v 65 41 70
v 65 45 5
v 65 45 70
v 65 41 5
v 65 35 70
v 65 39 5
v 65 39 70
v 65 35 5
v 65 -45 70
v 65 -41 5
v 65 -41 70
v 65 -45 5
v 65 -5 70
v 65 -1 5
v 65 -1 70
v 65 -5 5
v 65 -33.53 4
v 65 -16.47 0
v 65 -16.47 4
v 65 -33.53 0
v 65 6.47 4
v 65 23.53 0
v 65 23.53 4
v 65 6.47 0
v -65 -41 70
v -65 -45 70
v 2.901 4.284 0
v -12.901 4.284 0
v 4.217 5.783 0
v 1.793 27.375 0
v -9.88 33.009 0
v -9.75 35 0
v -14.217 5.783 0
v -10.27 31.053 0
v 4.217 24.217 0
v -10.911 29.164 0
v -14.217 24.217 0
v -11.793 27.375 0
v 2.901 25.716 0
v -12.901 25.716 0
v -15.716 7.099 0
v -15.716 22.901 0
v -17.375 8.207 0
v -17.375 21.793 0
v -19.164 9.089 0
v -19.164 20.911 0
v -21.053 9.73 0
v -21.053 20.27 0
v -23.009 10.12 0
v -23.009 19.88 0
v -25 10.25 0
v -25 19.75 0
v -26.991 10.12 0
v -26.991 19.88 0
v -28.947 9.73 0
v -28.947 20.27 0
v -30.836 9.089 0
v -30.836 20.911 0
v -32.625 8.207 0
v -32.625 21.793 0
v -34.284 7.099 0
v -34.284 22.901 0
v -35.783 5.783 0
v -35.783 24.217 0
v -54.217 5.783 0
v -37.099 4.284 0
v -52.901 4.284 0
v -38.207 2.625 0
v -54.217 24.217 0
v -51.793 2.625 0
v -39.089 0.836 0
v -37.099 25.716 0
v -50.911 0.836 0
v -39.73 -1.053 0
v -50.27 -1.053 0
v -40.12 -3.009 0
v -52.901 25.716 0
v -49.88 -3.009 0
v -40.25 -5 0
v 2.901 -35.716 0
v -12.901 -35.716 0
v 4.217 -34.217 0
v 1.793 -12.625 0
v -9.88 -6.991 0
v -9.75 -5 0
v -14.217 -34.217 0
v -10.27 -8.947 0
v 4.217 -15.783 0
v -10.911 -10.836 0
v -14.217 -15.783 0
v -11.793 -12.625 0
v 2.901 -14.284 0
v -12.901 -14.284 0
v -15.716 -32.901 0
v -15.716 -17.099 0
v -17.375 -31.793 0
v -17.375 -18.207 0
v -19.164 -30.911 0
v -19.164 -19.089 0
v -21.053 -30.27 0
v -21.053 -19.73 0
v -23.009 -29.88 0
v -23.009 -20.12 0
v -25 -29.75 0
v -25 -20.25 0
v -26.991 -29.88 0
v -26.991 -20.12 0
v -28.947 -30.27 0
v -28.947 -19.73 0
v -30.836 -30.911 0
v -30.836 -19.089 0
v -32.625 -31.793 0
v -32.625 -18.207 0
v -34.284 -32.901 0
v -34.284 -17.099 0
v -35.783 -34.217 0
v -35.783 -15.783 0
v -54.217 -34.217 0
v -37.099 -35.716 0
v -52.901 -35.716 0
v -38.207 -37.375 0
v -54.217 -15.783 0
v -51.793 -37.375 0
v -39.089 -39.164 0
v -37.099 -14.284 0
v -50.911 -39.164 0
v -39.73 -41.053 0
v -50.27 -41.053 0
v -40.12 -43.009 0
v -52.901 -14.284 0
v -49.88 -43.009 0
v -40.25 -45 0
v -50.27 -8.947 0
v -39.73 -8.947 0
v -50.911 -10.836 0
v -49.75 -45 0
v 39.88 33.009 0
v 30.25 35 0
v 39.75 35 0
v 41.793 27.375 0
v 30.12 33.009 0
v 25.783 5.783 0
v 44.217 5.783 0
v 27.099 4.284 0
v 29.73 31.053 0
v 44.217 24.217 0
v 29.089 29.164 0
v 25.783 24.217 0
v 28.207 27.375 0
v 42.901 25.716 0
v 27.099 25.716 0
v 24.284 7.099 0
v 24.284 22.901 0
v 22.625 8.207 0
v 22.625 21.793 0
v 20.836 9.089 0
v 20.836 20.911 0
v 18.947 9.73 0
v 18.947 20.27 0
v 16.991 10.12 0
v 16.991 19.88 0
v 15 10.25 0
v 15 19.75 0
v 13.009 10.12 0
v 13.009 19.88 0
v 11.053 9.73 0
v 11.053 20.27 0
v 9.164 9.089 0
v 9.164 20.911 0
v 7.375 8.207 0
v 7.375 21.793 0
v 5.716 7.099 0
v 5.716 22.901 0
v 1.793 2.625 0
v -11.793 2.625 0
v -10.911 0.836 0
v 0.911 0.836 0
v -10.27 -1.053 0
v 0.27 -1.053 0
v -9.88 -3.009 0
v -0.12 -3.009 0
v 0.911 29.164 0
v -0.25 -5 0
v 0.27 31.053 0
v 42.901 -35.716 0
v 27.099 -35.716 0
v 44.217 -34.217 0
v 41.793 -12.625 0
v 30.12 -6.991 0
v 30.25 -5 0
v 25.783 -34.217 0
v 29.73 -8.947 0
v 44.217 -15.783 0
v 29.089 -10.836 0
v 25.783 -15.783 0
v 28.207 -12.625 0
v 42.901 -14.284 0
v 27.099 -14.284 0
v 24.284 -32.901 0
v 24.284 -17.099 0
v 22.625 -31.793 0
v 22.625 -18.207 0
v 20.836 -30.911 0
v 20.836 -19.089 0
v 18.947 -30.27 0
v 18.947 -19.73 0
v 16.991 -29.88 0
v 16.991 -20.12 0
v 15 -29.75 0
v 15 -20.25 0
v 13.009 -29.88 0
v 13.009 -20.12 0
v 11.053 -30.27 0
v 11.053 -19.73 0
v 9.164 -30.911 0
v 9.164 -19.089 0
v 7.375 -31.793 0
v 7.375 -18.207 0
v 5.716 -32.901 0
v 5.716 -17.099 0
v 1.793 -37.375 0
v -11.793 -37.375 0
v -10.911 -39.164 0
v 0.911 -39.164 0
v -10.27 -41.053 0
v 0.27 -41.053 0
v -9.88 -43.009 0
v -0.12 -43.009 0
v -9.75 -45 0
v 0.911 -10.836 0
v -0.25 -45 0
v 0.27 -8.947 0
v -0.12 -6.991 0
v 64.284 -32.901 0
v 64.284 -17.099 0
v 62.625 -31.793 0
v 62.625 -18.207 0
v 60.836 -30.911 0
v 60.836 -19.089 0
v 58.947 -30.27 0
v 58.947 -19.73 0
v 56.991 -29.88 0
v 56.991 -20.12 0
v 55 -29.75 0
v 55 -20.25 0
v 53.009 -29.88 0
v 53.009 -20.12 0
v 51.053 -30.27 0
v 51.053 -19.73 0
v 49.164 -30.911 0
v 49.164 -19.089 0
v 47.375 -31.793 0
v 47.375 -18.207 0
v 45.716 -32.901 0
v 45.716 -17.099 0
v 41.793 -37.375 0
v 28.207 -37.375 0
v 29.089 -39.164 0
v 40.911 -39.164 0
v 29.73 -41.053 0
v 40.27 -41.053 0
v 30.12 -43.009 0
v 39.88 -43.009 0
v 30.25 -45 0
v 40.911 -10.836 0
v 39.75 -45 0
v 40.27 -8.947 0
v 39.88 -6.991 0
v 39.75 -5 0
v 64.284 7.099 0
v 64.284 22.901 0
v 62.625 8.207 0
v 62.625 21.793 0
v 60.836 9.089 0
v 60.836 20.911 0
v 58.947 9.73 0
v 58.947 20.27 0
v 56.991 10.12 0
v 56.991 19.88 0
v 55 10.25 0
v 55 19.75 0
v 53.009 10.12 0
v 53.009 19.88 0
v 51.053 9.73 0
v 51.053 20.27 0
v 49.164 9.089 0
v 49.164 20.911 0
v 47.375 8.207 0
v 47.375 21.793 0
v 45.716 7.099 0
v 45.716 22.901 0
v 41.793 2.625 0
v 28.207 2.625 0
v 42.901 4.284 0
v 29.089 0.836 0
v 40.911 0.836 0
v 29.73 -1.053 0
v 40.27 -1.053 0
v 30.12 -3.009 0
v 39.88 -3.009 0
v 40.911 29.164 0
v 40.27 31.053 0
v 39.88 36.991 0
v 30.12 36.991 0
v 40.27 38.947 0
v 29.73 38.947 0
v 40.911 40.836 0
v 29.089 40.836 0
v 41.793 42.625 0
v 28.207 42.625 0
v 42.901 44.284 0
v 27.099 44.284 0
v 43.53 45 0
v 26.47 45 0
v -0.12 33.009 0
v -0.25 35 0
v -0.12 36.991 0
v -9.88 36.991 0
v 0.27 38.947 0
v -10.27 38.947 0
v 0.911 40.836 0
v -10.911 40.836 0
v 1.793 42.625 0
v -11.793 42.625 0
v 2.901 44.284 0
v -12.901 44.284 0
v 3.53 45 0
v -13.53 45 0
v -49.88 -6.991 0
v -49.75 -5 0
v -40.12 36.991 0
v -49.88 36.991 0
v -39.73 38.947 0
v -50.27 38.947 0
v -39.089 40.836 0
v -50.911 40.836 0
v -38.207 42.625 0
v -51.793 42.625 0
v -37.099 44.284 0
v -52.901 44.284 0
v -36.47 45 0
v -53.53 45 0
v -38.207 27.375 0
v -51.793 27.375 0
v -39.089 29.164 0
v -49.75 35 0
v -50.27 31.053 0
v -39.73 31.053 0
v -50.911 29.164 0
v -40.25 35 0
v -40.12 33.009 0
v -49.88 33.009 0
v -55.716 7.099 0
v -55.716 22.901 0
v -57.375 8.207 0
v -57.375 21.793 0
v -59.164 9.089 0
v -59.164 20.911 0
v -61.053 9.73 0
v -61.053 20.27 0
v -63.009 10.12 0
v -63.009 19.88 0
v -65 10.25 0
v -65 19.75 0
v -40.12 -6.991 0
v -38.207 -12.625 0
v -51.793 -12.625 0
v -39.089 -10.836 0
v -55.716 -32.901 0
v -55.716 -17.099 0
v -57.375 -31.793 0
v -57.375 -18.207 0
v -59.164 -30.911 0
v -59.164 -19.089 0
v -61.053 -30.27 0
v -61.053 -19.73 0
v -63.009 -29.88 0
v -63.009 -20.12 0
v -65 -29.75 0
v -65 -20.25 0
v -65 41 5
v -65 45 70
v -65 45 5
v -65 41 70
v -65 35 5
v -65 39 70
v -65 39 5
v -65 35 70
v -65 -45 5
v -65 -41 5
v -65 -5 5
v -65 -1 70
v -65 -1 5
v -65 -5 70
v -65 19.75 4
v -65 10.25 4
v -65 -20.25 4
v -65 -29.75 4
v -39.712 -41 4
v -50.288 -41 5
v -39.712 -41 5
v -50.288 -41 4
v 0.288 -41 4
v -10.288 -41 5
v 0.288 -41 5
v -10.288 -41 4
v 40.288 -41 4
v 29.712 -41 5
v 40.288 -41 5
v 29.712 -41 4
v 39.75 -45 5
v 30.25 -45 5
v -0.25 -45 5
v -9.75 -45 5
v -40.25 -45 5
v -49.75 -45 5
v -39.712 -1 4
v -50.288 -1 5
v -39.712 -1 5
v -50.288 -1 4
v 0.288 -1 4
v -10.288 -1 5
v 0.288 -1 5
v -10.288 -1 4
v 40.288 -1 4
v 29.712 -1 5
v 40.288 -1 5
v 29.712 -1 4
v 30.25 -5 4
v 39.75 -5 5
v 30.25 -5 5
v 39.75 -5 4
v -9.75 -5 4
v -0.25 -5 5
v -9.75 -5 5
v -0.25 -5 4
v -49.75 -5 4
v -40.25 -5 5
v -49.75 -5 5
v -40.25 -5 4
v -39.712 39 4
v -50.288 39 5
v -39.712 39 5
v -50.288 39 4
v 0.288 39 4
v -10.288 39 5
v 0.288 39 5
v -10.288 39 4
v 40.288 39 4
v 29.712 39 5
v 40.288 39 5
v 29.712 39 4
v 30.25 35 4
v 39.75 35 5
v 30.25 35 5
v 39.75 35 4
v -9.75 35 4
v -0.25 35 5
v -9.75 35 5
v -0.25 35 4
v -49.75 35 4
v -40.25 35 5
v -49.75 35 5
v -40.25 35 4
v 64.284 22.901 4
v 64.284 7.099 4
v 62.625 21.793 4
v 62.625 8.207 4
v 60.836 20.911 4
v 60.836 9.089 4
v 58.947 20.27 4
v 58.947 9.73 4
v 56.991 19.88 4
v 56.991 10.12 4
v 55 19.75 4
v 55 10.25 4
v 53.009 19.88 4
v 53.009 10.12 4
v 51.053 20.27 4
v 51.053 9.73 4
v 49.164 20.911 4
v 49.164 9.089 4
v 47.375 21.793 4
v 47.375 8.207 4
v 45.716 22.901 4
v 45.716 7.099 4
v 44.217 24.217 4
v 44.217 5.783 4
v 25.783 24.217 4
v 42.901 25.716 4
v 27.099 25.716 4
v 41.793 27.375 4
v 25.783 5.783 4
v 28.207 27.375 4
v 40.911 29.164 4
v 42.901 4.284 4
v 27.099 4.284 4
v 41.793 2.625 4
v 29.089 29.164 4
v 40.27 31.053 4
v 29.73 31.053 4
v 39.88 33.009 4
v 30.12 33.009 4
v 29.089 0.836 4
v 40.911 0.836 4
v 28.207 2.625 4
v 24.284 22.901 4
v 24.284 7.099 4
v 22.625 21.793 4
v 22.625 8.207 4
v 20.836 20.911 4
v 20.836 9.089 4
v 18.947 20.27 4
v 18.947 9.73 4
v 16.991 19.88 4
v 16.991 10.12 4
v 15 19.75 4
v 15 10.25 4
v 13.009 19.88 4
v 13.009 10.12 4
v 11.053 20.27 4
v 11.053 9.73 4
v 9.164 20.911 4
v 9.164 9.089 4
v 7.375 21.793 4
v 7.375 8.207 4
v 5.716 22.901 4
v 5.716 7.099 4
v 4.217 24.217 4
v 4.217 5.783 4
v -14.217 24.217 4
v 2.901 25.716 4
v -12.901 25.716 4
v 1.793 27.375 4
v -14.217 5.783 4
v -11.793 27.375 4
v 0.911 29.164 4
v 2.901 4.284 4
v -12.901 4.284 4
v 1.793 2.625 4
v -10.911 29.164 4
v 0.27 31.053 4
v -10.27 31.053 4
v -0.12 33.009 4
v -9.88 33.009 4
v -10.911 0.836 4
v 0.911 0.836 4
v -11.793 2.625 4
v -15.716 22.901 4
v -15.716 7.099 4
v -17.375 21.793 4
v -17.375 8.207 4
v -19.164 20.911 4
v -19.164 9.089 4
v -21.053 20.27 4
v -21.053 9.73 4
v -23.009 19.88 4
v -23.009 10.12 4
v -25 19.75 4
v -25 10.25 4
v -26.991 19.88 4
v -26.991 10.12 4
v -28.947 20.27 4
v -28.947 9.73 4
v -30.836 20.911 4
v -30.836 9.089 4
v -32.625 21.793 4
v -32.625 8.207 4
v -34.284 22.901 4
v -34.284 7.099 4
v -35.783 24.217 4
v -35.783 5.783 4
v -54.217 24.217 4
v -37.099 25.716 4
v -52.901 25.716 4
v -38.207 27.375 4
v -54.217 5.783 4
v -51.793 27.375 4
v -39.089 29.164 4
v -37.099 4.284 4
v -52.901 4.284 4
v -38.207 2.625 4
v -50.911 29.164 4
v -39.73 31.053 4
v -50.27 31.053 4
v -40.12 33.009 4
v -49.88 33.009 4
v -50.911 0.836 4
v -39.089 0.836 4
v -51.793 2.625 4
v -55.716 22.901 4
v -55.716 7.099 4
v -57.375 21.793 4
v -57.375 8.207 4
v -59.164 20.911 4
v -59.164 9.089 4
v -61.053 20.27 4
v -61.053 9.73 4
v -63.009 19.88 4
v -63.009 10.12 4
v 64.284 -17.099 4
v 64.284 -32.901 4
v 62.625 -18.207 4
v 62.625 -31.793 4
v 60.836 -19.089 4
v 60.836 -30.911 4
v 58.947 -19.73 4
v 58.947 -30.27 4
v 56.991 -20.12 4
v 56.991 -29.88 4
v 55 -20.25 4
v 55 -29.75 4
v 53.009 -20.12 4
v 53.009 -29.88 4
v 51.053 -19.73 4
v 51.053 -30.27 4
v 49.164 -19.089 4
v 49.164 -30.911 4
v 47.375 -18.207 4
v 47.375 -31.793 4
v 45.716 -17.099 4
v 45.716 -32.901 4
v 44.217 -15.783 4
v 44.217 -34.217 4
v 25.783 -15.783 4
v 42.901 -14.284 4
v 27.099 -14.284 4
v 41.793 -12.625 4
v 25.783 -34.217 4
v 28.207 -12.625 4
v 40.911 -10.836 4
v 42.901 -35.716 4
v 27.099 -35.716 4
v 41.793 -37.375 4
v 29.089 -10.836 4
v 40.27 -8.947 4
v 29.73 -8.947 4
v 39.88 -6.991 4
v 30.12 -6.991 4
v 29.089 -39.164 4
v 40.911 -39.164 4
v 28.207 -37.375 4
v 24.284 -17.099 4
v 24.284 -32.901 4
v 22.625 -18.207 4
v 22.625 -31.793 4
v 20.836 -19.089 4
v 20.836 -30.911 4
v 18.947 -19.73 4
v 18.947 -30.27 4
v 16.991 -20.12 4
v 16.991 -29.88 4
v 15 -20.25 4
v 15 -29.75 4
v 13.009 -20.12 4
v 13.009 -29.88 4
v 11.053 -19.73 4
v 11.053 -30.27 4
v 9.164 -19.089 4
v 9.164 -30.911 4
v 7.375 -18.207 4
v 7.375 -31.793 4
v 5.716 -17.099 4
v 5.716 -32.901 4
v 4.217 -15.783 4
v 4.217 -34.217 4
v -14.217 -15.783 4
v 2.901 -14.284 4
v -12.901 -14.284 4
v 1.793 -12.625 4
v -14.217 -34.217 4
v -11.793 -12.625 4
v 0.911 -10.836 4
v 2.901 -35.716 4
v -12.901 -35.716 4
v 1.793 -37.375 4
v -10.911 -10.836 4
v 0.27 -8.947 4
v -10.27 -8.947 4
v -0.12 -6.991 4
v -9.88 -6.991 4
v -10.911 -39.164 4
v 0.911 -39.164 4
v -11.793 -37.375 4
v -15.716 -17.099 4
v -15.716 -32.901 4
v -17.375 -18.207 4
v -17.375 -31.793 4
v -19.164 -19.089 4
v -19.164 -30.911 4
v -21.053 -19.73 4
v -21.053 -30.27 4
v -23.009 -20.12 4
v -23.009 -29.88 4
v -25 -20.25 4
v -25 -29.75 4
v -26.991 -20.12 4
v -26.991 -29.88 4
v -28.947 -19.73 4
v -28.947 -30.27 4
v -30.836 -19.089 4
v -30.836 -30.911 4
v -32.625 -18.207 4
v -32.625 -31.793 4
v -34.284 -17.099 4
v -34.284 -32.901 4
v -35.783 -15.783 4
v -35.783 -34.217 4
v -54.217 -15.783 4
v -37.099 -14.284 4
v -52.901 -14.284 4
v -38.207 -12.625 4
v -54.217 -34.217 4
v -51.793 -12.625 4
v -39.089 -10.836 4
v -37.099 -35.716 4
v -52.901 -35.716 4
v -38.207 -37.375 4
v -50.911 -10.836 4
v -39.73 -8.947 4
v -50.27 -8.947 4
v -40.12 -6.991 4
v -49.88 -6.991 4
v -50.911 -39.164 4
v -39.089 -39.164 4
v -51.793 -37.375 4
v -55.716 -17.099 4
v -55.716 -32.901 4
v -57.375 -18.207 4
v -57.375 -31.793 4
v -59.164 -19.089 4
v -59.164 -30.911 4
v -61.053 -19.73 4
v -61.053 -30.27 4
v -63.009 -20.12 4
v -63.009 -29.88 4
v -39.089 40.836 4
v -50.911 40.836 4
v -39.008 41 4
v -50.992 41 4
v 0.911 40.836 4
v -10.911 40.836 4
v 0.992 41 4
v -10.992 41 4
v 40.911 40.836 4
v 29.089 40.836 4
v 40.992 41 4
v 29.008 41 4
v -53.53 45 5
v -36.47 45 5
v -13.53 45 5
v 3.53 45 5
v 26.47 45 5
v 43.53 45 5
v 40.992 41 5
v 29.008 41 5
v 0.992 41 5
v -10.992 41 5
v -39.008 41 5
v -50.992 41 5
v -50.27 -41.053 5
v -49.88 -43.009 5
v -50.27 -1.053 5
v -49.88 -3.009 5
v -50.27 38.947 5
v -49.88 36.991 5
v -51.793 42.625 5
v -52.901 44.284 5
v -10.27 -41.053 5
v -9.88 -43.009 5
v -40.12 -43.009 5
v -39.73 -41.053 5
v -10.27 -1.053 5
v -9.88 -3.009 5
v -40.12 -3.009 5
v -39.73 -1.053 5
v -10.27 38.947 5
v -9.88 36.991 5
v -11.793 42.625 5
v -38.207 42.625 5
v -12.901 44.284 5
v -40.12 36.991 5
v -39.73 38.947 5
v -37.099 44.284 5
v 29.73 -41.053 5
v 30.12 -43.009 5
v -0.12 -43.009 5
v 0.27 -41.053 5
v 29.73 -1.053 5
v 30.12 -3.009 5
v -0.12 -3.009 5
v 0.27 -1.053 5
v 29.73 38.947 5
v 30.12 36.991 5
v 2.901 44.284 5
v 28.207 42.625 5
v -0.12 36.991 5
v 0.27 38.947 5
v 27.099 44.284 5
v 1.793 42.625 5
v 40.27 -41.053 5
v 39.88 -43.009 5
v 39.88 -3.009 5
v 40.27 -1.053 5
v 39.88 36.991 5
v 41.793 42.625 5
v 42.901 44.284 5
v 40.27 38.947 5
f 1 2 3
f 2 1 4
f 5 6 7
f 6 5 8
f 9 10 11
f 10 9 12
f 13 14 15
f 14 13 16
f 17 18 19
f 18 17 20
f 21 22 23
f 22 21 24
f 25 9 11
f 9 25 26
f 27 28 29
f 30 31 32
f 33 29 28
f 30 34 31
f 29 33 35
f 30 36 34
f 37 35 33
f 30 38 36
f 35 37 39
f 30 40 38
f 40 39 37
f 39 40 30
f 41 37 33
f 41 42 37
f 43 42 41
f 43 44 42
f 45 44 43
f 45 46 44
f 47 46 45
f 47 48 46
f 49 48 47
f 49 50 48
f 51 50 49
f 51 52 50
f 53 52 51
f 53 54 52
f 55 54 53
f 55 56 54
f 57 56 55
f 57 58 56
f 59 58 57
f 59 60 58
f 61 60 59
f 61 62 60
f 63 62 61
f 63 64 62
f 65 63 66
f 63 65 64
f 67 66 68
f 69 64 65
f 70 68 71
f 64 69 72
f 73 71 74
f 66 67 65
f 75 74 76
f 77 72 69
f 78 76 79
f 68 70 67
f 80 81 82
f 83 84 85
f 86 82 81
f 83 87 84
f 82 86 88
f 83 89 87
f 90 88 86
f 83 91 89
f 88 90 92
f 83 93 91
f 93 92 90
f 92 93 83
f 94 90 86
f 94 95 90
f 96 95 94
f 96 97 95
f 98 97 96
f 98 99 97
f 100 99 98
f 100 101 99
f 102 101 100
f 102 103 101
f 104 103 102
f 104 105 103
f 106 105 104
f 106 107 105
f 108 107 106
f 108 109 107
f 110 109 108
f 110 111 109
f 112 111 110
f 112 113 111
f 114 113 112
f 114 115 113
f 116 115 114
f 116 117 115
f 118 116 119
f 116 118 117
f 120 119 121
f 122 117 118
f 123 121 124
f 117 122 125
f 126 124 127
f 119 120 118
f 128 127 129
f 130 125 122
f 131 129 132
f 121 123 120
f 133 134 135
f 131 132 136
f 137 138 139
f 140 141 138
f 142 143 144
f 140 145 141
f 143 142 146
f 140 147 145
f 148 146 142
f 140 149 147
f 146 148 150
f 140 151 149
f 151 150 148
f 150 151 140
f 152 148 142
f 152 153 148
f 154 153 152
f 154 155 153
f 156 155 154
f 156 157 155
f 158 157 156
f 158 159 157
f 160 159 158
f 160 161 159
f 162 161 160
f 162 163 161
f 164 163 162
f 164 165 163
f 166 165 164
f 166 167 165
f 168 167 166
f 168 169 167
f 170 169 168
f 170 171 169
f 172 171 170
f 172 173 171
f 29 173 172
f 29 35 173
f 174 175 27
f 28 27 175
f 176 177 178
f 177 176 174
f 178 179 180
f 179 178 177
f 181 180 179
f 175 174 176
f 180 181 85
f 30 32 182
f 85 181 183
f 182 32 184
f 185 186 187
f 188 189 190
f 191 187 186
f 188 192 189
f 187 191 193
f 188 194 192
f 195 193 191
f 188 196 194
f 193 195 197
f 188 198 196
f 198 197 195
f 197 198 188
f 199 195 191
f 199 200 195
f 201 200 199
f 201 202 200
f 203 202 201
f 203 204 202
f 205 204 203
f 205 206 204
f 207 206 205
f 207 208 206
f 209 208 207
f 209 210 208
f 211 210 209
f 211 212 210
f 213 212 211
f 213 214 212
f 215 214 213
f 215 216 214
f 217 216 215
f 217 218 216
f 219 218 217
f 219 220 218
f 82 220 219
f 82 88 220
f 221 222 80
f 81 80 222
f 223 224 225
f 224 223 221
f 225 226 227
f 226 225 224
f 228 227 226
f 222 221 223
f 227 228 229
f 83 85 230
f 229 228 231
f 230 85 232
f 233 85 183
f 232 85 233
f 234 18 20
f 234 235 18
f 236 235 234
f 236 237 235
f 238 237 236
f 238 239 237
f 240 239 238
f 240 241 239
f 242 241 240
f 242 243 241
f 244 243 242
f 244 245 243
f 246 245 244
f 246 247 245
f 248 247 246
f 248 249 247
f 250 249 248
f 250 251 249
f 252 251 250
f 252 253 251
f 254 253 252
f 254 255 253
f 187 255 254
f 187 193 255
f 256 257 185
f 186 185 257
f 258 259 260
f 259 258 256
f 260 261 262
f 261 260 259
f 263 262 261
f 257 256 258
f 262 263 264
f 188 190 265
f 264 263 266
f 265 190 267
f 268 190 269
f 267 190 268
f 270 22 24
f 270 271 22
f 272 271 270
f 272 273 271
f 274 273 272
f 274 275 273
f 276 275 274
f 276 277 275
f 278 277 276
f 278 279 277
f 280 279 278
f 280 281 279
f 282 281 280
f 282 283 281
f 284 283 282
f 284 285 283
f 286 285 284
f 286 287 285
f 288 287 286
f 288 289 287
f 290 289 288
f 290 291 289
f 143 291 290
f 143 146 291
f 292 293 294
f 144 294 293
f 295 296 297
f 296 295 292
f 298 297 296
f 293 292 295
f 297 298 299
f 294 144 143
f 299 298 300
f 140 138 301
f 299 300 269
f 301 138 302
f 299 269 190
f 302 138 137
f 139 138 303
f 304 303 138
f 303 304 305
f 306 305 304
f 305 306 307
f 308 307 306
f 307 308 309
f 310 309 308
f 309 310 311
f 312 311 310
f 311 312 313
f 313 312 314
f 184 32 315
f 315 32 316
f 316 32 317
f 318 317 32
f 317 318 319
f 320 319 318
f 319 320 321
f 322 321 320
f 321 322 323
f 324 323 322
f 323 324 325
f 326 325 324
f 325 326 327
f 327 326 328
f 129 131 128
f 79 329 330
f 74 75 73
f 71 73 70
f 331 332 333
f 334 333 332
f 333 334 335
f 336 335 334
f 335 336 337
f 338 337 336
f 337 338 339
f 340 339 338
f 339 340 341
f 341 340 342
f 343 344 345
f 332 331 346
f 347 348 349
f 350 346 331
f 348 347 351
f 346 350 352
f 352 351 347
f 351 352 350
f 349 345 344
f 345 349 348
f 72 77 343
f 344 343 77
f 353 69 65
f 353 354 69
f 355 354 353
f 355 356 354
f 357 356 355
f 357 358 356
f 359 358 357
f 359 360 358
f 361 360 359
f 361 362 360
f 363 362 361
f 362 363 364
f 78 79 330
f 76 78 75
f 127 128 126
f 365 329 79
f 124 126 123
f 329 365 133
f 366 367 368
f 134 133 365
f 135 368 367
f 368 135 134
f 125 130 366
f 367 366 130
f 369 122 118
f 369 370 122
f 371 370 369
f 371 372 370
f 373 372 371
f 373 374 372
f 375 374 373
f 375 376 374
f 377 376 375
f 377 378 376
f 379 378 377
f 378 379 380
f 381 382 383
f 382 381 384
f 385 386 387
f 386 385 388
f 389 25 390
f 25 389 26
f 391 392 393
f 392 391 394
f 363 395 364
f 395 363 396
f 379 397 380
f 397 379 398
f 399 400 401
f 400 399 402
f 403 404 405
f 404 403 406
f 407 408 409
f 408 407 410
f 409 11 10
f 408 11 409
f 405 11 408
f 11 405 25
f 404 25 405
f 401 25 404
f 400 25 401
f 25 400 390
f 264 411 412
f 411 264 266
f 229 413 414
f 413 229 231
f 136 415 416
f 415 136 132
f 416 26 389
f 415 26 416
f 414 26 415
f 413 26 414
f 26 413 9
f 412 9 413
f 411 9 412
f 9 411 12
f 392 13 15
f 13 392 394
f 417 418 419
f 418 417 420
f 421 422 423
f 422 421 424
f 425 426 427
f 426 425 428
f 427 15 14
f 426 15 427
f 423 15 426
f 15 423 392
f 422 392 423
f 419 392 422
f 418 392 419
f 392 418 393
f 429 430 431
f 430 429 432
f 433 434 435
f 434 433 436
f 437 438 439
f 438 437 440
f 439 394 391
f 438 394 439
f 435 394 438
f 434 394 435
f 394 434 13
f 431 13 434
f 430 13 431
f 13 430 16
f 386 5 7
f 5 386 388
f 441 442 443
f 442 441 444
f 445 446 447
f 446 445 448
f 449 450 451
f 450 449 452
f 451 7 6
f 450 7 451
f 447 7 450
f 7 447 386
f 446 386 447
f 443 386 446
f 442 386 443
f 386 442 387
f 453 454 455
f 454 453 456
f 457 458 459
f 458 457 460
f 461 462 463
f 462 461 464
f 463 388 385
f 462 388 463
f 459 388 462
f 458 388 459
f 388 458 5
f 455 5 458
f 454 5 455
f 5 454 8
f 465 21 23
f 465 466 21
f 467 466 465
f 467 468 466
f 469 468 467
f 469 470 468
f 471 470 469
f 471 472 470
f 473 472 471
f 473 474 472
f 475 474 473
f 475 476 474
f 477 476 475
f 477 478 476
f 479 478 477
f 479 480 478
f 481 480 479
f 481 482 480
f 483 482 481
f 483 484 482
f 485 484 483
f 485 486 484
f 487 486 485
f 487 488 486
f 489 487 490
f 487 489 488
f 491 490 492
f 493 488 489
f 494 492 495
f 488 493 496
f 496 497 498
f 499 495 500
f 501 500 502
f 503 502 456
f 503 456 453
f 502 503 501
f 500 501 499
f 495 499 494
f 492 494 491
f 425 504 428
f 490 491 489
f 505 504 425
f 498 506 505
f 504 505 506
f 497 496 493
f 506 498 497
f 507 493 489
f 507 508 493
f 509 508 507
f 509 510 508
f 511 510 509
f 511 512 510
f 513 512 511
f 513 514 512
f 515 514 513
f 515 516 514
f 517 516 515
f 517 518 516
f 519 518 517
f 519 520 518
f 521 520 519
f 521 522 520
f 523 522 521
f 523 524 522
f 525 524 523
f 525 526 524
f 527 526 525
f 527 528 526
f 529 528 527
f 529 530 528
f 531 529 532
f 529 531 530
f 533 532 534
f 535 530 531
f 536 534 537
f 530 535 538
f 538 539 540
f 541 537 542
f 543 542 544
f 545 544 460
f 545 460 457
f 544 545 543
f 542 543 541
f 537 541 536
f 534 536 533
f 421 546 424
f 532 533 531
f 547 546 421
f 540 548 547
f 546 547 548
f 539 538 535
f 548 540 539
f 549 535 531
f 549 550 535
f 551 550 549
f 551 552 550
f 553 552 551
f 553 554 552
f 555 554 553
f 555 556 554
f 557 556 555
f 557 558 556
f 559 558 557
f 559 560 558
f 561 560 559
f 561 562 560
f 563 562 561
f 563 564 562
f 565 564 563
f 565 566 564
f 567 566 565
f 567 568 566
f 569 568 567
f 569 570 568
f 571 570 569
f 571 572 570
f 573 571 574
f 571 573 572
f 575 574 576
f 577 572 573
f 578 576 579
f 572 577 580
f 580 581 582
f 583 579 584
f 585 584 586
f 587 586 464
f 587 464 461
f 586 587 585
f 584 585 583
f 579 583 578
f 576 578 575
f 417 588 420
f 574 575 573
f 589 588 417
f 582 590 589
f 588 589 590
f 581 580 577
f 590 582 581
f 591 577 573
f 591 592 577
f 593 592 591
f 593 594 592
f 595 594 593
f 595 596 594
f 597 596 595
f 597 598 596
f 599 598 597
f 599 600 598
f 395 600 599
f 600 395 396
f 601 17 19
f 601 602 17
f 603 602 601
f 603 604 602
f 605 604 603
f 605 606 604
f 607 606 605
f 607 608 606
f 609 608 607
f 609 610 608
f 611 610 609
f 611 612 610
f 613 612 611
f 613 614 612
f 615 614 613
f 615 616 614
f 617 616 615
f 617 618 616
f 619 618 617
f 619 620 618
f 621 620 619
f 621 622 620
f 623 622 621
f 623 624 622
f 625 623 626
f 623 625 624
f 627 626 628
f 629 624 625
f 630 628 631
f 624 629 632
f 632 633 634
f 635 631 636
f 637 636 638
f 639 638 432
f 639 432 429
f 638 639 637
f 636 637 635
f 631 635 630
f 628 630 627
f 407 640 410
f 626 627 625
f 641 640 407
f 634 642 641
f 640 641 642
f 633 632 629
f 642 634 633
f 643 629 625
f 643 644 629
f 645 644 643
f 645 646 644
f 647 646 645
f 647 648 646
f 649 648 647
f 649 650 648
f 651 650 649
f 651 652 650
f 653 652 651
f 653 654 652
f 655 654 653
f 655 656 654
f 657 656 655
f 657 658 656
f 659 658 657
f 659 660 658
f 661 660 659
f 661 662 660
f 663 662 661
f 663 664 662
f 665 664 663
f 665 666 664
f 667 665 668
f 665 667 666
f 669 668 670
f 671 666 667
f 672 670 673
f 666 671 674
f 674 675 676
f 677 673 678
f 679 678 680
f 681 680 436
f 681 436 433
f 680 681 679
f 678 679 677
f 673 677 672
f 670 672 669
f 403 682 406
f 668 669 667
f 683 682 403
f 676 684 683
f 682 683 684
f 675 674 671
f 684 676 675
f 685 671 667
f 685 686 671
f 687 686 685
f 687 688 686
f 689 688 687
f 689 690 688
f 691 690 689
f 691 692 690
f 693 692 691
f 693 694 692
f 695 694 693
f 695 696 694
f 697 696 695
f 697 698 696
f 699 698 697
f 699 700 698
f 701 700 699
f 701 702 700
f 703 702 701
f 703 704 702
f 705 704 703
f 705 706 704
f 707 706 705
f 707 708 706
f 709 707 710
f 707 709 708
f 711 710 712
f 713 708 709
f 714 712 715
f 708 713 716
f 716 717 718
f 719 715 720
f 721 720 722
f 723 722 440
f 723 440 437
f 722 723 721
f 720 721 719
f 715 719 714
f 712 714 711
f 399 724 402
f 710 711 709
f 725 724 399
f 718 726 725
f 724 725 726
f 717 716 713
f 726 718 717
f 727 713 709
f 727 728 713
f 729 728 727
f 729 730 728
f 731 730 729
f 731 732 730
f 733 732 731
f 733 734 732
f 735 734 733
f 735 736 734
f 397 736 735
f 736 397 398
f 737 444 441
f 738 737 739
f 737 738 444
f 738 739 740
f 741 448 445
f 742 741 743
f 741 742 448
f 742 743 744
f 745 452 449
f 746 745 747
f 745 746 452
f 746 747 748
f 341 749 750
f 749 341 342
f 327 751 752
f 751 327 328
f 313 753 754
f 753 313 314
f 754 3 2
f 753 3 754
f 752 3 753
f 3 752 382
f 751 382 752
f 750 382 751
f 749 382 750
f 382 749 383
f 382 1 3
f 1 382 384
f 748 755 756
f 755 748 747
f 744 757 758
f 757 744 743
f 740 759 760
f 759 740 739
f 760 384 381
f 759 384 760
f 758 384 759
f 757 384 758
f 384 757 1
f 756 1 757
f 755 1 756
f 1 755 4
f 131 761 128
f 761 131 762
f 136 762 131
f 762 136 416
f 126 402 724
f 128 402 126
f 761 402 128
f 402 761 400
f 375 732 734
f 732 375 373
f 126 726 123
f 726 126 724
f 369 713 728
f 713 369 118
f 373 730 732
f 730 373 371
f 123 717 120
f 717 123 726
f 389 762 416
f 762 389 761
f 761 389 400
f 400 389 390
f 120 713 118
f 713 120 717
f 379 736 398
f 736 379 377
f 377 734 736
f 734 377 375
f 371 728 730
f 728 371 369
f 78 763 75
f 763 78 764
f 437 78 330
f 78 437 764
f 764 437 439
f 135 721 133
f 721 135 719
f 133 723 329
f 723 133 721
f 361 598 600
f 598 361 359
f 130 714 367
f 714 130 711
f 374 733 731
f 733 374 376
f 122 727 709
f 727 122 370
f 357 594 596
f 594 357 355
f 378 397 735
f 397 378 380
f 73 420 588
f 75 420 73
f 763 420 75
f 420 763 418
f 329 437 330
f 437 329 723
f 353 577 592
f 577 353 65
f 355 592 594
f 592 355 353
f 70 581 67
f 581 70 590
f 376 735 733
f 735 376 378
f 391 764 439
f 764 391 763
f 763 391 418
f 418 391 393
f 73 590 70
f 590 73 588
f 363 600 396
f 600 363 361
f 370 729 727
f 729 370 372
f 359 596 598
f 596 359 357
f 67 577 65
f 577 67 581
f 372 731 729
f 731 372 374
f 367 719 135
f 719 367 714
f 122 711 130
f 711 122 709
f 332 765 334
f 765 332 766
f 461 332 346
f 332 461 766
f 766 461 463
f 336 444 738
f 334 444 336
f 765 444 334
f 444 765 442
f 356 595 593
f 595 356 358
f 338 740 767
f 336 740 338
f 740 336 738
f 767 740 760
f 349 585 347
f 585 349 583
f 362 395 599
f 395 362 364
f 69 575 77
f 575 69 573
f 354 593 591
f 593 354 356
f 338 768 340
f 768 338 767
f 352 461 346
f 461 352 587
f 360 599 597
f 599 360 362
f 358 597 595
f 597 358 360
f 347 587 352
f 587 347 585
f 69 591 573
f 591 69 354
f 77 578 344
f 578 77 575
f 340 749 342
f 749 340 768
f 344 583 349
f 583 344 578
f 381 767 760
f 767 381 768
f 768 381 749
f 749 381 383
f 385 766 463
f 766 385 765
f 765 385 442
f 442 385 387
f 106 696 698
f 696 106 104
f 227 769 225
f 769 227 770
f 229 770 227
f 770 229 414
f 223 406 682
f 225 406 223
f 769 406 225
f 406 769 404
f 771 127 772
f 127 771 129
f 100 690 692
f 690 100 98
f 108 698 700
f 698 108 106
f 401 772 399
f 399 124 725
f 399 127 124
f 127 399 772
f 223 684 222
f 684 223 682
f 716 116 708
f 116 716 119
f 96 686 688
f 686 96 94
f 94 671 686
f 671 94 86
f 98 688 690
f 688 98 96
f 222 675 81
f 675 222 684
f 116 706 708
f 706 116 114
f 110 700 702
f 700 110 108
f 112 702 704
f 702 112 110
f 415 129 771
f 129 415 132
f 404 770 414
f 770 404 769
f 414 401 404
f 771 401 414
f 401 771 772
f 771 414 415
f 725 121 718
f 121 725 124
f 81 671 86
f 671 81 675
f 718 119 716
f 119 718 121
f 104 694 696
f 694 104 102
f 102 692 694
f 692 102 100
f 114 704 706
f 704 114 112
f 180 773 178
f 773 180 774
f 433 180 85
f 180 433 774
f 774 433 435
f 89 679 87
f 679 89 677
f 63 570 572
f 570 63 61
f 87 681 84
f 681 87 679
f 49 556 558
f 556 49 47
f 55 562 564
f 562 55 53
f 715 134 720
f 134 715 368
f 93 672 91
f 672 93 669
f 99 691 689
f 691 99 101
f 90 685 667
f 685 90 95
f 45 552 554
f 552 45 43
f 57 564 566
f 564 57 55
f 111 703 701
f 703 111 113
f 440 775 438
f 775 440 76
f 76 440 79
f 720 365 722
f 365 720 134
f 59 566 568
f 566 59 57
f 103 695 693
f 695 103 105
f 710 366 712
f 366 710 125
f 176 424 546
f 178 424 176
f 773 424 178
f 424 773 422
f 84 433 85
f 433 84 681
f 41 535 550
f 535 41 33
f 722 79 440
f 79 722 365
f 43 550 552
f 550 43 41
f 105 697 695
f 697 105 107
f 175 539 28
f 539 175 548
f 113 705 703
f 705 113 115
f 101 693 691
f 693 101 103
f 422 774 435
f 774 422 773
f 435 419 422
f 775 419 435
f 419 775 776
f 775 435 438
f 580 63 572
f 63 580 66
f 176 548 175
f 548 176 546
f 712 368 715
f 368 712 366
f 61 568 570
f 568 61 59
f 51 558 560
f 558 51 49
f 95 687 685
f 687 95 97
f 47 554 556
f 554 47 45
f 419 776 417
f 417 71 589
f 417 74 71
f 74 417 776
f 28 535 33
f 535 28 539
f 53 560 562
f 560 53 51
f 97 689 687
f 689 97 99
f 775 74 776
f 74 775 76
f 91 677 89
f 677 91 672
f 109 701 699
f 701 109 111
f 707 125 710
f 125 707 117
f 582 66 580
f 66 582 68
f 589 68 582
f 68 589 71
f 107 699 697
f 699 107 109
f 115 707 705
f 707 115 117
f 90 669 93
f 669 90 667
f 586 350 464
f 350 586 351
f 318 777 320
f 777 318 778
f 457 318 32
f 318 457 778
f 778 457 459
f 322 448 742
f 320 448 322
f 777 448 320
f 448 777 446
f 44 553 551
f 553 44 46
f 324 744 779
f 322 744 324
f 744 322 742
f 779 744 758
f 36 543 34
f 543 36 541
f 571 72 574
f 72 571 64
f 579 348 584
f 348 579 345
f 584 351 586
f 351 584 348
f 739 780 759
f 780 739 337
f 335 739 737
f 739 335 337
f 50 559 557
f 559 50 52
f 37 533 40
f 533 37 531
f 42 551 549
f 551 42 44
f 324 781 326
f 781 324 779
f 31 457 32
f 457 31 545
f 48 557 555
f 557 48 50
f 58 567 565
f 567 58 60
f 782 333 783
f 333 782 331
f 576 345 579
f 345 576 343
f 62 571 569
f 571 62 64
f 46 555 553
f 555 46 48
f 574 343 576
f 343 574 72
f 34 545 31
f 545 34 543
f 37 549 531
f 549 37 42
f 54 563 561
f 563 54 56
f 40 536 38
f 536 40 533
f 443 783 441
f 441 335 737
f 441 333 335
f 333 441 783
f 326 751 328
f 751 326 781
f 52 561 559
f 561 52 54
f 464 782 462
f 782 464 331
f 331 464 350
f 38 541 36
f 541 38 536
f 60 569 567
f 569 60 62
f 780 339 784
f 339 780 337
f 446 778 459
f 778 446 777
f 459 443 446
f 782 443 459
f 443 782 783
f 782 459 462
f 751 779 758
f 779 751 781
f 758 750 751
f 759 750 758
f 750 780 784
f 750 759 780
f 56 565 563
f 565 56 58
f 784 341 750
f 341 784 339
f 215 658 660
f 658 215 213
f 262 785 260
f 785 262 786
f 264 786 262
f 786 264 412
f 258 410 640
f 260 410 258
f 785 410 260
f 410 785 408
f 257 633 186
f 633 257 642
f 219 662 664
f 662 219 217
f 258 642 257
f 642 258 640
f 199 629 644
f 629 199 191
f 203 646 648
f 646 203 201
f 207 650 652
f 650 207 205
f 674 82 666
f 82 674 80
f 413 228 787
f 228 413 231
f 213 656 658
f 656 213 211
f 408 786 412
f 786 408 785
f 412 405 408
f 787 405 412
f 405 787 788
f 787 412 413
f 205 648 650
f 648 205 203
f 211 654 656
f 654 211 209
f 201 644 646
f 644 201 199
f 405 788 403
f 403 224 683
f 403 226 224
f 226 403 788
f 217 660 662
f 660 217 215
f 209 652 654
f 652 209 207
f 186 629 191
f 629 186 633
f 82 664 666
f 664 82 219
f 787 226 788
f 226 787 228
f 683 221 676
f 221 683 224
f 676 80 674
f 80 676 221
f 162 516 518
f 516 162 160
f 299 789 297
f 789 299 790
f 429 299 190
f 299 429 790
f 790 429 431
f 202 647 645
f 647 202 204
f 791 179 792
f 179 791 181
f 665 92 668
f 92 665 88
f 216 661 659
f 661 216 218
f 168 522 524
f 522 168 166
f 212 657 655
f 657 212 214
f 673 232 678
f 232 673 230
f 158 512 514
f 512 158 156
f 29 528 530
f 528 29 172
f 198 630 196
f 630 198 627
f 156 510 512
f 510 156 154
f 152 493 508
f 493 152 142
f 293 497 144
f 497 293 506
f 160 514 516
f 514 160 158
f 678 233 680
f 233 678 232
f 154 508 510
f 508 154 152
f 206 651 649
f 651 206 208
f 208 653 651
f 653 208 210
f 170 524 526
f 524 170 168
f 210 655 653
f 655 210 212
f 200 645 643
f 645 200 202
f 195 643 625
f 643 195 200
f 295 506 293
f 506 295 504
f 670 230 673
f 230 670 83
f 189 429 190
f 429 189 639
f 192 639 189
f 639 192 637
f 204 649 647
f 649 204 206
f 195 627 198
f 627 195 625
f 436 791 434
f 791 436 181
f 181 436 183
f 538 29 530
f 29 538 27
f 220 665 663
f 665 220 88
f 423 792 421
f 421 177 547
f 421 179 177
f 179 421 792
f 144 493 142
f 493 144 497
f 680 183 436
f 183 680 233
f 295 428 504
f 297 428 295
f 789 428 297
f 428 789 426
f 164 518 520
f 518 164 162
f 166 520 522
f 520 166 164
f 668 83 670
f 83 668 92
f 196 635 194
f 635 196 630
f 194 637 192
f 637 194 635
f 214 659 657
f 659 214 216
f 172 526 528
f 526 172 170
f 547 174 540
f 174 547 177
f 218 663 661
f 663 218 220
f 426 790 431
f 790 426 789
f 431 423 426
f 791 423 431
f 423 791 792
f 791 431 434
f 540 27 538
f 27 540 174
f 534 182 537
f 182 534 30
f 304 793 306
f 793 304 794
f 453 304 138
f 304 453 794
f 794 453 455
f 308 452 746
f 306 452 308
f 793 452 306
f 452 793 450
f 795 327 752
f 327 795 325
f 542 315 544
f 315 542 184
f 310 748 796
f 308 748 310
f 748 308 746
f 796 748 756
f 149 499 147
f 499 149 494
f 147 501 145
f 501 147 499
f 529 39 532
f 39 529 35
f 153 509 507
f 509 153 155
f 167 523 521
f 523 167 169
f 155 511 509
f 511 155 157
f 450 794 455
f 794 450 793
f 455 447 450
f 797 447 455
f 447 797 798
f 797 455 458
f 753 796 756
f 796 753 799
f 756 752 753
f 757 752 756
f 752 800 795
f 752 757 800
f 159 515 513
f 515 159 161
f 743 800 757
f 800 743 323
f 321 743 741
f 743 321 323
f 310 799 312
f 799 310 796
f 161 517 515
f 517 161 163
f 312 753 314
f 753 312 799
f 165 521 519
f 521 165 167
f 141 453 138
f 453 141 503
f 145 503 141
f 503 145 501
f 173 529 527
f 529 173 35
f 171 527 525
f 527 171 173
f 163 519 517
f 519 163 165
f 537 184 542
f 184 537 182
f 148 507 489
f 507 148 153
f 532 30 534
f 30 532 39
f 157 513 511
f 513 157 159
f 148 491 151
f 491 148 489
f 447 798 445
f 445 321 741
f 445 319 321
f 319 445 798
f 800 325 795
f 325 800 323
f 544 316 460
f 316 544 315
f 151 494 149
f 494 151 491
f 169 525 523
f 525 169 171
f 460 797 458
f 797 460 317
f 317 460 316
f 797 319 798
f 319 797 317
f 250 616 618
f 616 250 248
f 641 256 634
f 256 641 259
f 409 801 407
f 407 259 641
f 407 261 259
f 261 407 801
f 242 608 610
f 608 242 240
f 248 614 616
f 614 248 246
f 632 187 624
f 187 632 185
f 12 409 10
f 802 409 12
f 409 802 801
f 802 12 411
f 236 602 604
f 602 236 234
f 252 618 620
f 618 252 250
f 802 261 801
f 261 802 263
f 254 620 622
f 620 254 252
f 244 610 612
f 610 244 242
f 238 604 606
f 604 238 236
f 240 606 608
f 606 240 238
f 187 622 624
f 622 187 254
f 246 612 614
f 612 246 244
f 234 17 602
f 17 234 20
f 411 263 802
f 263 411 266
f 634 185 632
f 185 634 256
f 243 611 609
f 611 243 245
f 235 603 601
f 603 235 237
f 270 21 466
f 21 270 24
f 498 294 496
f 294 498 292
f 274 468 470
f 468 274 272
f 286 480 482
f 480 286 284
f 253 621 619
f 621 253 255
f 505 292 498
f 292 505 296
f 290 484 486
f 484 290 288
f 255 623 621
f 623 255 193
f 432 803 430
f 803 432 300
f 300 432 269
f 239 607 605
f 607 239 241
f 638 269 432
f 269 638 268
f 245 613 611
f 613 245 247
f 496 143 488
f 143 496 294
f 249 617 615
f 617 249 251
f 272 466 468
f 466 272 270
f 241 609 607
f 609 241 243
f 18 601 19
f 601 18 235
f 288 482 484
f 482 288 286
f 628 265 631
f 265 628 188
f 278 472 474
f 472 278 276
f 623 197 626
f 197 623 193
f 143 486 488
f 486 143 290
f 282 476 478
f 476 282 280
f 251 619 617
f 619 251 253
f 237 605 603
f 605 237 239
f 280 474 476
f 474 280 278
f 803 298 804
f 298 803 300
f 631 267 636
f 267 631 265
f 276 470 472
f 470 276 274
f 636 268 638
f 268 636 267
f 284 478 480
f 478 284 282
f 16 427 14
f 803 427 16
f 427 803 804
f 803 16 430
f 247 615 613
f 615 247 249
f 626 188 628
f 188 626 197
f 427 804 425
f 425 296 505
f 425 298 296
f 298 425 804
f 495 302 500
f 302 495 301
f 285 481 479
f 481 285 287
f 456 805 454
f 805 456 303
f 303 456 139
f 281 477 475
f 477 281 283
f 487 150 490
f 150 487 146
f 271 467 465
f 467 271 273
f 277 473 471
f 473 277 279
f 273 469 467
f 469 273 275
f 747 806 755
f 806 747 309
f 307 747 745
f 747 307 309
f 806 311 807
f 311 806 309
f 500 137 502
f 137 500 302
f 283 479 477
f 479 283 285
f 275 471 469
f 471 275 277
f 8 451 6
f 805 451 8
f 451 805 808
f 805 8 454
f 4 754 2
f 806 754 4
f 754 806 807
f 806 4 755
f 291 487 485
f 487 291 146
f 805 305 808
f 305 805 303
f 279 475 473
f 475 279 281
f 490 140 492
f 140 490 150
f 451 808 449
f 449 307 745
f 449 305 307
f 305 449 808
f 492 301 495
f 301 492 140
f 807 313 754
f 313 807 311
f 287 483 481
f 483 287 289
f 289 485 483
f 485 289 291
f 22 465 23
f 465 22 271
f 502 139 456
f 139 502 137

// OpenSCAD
// Tube rack for six 50 mL conical (Falcon-type) tubes - printed upside down and flipped over.
// A flat plate with a 2x3 hole grid and two solid walls run along the long edges. The two
// short ends are open. The walls and plate form a U-cross section along the length.
// NOVEL general part.

cols   = 3;
rows   = 2;
tube_d = 30.5;
pitch_x = 40;
pitch_y = 40;
plate_w = 130;
plate_l = 90;
plate_t = 4;
wall_h = 70;

$fn = 48;

plate_z = 4;
wall_t  = 4;

difference() {
    union() {
        translate([-plate_w / 2, -plate_l / 2, 0]) cube([plate_w, plate_l, plate_z]);
        for (y = [-plate_l / 2 : pitch_y : plate_l / 2])
            translate([-plate_w / 2, y, 0]) cube([plate_w, wall_t, wall_h]);
        for (y = [plate_l / 2 - wall_t : pitch_y : plate_l / 2 + wall_t])
            translate([-plate_w / 2, y, 0]) cube([plate_w, wall_t, wall_h]);
    }
    for (x = [-plate_w / 2 : pitch_x : plate_w / 2])
        for (y = [-plate_l / 2 : pitch_y : plate_l / 2])
            translate([x, y, -1]) cylinder(h = plate_z + 2, d = tube_d);
}
